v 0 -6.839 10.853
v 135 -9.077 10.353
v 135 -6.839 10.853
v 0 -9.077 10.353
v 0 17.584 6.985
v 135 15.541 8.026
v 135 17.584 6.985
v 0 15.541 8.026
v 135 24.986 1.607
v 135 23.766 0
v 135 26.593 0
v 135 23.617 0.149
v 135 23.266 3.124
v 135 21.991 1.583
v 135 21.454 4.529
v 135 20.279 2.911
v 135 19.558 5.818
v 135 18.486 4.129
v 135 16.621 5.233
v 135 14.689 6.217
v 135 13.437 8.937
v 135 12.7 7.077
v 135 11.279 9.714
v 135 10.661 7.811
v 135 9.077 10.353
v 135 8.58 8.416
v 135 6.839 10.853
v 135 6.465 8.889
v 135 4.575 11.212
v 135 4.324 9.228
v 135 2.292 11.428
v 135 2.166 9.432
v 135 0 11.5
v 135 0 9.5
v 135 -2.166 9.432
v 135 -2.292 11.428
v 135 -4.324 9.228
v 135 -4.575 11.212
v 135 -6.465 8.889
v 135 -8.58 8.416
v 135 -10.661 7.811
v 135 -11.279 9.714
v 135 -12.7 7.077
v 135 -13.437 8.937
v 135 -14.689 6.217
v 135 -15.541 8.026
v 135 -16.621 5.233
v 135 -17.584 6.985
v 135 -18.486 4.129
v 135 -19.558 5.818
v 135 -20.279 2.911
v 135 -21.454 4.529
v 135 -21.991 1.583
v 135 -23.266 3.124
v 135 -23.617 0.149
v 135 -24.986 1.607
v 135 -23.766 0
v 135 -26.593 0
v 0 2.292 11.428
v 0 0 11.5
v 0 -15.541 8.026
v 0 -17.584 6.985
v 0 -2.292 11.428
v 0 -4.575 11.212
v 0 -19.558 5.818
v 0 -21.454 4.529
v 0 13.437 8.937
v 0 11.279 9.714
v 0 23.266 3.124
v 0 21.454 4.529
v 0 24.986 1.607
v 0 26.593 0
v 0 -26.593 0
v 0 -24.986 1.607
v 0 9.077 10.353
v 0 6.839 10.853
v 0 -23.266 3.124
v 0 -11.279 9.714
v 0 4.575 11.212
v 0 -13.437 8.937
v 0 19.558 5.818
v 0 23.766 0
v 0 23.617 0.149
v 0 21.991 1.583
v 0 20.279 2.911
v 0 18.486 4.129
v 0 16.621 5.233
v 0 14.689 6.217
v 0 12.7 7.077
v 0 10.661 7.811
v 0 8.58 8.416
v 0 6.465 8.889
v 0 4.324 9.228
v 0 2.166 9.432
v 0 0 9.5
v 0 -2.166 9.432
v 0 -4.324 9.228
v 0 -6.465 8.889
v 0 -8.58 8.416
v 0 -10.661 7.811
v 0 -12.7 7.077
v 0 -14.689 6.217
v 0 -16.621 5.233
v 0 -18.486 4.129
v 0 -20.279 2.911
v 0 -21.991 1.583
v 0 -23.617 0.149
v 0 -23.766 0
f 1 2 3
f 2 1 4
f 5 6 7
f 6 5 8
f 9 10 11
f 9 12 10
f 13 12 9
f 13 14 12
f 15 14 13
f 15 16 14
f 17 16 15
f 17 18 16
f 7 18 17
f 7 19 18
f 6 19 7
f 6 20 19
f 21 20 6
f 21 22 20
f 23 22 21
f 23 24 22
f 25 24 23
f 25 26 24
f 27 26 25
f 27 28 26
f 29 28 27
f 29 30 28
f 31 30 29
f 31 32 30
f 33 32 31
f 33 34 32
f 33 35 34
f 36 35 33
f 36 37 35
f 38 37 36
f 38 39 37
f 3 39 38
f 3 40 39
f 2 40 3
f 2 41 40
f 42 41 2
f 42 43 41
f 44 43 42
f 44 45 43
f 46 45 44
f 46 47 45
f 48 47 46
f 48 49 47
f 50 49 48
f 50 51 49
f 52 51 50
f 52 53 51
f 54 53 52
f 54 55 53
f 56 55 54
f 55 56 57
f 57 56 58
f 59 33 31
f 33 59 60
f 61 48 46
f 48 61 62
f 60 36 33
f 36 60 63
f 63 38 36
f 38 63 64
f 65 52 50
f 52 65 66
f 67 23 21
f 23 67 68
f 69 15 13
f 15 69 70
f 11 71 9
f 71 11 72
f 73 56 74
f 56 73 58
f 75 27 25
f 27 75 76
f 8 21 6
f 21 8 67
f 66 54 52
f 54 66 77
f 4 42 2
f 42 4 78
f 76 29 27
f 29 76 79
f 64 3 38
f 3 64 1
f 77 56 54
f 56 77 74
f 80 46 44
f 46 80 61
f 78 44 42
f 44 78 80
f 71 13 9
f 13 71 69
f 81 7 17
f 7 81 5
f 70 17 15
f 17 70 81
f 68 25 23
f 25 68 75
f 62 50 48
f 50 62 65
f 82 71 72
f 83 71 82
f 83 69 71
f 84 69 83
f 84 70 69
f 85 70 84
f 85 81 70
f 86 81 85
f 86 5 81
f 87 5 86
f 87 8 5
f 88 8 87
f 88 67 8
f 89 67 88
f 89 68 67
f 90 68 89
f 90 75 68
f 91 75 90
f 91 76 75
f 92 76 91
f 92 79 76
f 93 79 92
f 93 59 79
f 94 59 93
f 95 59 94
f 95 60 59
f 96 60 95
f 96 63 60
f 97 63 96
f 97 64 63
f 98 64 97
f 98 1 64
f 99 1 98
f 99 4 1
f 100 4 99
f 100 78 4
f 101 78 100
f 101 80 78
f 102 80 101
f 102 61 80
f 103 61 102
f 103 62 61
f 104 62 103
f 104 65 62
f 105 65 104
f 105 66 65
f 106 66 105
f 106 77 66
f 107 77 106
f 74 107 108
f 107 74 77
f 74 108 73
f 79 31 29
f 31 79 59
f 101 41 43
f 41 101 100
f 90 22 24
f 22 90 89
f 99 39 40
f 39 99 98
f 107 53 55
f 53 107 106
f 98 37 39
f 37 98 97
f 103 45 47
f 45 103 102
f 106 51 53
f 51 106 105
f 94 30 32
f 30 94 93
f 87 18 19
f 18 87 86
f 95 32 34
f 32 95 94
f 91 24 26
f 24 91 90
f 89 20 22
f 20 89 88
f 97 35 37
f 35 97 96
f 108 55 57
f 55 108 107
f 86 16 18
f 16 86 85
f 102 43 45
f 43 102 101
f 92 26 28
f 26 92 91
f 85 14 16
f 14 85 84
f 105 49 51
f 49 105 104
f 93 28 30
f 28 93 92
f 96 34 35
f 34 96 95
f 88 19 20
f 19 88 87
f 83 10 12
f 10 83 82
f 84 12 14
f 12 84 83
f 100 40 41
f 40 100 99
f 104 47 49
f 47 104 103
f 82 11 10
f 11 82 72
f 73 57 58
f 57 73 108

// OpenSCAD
$fn = 100; 


module Einsatz(){
    difference(){
        cylinder(h=12, d=73);

        translate([0,0,-2])
        cylinder(h=12, d=69);

        translate([0,0,-25]) 
        rotate([0,90,0])
        cylinder(h=135, d=73);
    }

    difference(){
    
        color("green")
        translate([0,0,-40])
        cylinder(h=40, d=73);
        
        color("red")
        translate([0,0,-41])
        cylinder(h=42, d=69);
    
    }

}

module Kanal(){

    difference(){
        translate([0,0,-25]) 
        rotate([0,90,0])
        cylinder(h=135, d=73);

        color("pink")
        translate([-2,0,-25])
        rotate([0,90,0])
        cylinder(h=138, d=69);

        color("red")
        translate([135/2,-1,-50])
        cube([137,75,100], center=true);

    }



    }



//Einsatz(); 
//color("pink")
Kanal();

// color("gray")
// translate([2,0,5])
// rotate([0,90,0])
// cylinder(h=200, d=10);
